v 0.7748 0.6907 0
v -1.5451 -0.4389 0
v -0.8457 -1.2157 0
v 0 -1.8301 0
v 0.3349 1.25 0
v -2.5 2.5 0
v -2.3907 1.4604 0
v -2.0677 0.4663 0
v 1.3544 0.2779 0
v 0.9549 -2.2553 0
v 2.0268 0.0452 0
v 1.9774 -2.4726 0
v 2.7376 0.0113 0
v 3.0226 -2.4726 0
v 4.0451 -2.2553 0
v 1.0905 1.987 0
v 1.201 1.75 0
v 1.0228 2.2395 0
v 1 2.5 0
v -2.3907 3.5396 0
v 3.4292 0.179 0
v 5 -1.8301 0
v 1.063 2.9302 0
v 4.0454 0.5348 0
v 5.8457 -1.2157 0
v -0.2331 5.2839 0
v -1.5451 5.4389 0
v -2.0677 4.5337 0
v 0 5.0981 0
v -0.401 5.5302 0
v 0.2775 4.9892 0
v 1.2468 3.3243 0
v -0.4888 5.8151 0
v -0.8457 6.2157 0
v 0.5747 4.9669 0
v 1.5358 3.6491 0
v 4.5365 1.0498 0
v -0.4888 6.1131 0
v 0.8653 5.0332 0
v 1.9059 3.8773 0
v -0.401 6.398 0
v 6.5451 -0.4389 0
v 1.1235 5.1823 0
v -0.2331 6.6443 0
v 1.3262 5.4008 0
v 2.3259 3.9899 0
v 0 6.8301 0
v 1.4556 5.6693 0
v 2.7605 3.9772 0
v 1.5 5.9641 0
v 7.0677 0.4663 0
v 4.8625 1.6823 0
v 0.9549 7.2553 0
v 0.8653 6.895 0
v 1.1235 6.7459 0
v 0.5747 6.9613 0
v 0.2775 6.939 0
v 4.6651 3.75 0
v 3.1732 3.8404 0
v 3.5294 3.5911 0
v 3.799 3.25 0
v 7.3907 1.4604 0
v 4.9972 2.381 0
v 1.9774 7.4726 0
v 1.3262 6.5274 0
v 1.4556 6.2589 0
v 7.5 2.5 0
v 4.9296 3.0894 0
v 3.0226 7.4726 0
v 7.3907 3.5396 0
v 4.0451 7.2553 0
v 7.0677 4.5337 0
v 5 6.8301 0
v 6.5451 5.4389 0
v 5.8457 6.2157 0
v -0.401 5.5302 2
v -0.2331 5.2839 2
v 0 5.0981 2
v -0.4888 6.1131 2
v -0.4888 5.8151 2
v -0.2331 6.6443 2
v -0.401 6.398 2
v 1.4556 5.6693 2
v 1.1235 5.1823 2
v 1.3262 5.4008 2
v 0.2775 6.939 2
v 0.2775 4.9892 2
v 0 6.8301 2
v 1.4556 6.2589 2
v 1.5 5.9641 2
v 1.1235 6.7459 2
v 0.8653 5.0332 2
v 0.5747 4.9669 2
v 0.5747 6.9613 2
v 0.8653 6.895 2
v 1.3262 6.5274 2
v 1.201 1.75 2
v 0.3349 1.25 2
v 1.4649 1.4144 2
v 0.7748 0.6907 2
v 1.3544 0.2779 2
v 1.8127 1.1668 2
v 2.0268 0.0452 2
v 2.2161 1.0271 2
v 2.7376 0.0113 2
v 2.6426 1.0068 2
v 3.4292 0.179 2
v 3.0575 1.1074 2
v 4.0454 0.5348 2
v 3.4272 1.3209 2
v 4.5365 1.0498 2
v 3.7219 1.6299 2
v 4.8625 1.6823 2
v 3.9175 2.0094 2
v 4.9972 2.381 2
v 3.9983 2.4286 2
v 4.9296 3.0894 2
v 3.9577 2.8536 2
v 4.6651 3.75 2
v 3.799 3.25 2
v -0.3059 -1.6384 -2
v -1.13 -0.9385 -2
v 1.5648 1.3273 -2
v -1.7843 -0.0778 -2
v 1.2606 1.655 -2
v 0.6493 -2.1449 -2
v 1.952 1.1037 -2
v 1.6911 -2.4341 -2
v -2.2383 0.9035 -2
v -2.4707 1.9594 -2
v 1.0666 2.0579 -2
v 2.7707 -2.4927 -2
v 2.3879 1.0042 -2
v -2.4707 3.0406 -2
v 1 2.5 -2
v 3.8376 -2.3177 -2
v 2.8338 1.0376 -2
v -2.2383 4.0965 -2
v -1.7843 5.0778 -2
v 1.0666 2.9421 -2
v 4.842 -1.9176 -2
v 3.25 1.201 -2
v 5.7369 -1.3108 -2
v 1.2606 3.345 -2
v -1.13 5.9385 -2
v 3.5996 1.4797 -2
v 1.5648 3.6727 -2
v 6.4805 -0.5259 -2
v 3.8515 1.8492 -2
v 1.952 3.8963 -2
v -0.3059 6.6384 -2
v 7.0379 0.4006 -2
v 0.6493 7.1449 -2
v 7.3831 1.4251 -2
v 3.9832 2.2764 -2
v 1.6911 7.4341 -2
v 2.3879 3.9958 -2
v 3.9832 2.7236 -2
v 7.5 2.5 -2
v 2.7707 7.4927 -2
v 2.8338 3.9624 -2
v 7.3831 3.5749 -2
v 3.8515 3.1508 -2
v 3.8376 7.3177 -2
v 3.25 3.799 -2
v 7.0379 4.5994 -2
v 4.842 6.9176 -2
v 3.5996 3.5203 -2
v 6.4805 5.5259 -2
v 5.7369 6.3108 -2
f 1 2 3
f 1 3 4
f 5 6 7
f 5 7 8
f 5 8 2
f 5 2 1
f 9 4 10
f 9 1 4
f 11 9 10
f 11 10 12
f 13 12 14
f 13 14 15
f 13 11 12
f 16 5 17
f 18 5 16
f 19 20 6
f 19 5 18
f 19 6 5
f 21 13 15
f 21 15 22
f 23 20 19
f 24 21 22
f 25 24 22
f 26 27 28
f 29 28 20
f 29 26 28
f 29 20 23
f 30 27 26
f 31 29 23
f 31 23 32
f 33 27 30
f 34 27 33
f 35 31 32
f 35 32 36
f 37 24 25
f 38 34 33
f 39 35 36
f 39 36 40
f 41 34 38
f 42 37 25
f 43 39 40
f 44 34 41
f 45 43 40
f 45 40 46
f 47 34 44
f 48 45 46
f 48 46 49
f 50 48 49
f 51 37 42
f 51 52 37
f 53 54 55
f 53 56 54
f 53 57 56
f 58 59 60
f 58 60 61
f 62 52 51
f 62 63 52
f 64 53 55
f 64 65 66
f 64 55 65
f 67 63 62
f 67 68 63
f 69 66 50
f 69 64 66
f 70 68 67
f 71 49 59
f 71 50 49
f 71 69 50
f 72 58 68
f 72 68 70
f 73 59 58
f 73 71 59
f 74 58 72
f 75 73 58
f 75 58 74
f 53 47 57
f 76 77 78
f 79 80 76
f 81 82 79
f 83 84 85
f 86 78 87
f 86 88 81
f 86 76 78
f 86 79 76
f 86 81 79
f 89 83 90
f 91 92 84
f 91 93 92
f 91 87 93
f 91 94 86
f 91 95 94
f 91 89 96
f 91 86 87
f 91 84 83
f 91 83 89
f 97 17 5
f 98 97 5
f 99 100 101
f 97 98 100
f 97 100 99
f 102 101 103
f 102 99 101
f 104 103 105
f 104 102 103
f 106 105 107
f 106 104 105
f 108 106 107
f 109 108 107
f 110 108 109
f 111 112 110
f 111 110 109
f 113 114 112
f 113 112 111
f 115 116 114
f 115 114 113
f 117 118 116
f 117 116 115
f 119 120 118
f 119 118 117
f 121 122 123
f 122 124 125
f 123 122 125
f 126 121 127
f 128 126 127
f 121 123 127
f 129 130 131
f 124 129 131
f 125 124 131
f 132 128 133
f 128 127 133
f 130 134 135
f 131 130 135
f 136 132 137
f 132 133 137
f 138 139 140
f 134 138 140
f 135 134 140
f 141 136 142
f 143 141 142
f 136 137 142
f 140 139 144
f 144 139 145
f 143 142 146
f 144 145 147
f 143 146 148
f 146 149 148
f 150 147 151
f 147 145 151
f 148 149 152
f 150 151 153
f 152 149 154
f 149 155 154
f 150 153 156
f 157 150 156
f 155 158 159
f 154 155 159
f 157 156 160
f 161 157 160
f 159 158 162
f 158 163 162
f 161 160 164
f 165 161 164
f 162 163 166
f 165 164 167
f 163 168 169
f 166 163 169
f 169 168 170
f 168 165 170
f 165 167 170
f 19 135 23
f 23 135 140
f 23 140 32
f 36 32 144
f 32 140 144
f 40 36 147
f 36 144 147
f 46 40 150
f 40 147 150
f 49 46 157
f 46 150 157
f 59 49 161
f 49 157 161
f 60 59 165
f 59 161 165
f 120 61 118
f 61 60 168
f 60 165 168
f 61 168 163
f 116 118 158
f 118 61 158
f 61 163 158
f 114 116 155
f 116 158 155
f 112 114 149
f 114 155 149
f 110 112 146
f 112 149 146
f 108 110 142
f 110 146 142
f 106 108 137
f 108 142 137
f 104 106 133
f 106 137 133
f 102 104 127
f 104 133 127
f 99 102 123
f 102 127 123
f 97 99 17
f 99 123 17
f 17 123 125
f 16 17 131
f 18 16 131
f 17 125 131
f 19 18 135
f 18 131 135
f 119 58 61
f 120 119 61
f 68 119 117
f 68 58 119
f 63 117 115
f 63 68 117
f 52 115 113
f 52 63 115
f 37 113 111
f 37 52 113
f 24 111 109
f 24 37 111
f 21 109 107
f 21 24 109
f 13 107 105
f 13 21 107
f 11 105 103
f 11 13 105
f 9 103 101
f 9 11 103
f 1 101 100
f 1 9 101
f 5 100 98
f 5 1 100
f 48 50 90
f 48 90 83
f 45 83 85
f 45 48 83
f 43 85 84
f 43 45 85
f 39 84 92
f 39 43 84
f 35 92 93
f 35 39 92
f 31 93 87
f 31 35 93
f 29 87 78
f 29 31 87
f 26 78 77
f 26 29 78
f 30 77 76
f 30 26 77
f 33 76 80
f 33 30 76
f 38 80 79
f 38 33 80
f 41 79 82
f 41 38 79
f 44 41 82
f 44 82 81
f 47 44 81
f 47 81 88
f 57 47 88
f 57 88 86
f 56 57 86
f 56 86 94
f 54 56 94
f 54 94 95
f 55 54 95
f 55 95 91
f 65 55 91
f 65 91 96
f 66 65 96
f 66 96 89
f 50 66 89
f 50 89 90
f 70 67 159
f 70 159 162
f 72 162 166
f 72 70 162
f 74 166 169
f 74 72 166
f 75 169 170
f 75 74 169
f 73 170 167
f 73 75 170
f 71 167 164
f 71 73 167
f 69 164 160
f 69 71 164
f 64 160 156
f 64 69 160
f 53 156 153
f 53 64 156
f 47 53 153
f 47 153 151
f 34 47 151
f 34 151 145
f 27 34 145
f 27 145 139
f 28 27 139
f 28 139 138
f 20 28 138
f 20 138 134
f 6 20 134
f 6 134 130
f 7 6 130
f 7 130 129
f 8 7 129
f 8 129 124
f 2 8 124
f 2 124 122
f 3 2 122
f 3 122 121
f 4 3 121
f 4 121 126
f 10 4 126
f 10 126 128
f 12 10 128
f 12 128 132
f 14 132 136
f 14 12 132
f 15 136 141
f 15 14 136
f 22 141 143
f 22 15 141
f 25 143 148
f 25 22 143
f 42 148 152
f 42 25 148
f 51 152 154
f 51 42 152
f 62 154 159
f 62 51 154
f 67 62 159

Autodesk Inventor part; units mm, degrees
ref_plane "YZ Plane" through (0, 0, 0) normal (1, 0, 0) x (0, 1, 0)
ref_plane "XZ Plane" through (0, 0, 0) normal (0, 1, 0) x (-1, 0, 0)
ref_plane "XY Plane" through (0, 0, 0) normal (0, 0, 1) x (1, 0, 0)
sketch "Sketch1" plane through (0, 0, 0) normal (0, 0, 1) x (1, 0, 0)
  circle A0 centre (2.5, 2.5) radius 5
  circle A1 centre (0.5, 5.9641) radius 1
  circle A2 centre (2.5, 2.5) radius 2.5
  point P0 (0, 0)
  point P1 (0, 0)
  point P2 (-2.5, 2.5)
  point P3 (0, 6.8301)
  point P4 (0, -1.8301)
  point P5 (0.5, 6.9641)
  point P6 (0, 2.5)
  point P7 (2.0779, 4.9641)
  dimension "d0" = 5
sketch "Sketch2" plane through (0, 0, 0) normal (0, 0, 1) x (1, 0, 0)
  circle A0 centre (2.5, 2.5) radius 5
  circle A1 centre (0.5, 5.9641) radius 1
  circle A2 centre (2.5, 2.5) radius 2.5
  point P0 (0, 0)
  point P1 (0, 0)
  point P2 (0, 0)
  point P3 (-2.5, 2.5)
  point P4 (0, 6.8301)
  point P5 (0, -1.8301)
  point P6 (0.5, 6.9641)
  point P7 (0, 2.5)
  point P8 (2.0779, 4.9641)
  dimension "d1" = 5
extrude "Extrusion1" add sketch "Sketch1" along normal blind 2 contours A1
extrude "Extrusion2" add sketch "Sketch2" against normal blind 2 contours A1 | A0 | A2
sketch "Sketch3" plane through (2.5, 2.5, 0) normal (0, 0, 1) x (1, 0, 0)
  circle A0 centre (0, 0) radius 5
  circle A1 centre (-2, 3.4641) radius 1
  arc A2 (-2.1651, -1.25) -> (2.1651, 1.25) centre (0, 0) ccw
  circle A3 centre (0, 0) radius 5 projected
  line L0 (0, 0) -> (2.1651, 1.25)
  line L1 (0, 0) -> (-2.1651, -1.25)
  circle A4 centre (-2, 3.4641) radius 1 projected
  point P0 (-2.5, -2.5)
  point P1 (-2.5, -2.5)
  point P2 (-2.5, -2.5)
  point P3 (-2.5, -2.5)
  point P4 (-5, 0)
  point P5 (-2.5, 4.3301)
  point P6 (-2.5, -4.3301)
  point P7 (-2, 4.4641)
  point P8 (-2.5, 0)
  point P9 (-0.4221, 2.4641)
  point P10 (-2.5, 4.3301)
  dimension "d6" = 5
extrude "Extrusion3" add sketch "Sketch3" along normal blind 2 contours L1 L0 A2
sketch "Sketch4" plane through (2.5, 2.5, -2) normal (0, 0, -1) x (-1, 0, 0)
  line L0 (-2.1651, 1.25) -> (2.1651, -1.25) projected
  circle A0 centre (0, 0) radius 1.5
  point P0 (2.5, -2.5)
  dimension "d9" = 3
extrude "Extrusion4" cut sketch "Sketch4" against normal up to surface (4 mm away)
properties part number "C"
